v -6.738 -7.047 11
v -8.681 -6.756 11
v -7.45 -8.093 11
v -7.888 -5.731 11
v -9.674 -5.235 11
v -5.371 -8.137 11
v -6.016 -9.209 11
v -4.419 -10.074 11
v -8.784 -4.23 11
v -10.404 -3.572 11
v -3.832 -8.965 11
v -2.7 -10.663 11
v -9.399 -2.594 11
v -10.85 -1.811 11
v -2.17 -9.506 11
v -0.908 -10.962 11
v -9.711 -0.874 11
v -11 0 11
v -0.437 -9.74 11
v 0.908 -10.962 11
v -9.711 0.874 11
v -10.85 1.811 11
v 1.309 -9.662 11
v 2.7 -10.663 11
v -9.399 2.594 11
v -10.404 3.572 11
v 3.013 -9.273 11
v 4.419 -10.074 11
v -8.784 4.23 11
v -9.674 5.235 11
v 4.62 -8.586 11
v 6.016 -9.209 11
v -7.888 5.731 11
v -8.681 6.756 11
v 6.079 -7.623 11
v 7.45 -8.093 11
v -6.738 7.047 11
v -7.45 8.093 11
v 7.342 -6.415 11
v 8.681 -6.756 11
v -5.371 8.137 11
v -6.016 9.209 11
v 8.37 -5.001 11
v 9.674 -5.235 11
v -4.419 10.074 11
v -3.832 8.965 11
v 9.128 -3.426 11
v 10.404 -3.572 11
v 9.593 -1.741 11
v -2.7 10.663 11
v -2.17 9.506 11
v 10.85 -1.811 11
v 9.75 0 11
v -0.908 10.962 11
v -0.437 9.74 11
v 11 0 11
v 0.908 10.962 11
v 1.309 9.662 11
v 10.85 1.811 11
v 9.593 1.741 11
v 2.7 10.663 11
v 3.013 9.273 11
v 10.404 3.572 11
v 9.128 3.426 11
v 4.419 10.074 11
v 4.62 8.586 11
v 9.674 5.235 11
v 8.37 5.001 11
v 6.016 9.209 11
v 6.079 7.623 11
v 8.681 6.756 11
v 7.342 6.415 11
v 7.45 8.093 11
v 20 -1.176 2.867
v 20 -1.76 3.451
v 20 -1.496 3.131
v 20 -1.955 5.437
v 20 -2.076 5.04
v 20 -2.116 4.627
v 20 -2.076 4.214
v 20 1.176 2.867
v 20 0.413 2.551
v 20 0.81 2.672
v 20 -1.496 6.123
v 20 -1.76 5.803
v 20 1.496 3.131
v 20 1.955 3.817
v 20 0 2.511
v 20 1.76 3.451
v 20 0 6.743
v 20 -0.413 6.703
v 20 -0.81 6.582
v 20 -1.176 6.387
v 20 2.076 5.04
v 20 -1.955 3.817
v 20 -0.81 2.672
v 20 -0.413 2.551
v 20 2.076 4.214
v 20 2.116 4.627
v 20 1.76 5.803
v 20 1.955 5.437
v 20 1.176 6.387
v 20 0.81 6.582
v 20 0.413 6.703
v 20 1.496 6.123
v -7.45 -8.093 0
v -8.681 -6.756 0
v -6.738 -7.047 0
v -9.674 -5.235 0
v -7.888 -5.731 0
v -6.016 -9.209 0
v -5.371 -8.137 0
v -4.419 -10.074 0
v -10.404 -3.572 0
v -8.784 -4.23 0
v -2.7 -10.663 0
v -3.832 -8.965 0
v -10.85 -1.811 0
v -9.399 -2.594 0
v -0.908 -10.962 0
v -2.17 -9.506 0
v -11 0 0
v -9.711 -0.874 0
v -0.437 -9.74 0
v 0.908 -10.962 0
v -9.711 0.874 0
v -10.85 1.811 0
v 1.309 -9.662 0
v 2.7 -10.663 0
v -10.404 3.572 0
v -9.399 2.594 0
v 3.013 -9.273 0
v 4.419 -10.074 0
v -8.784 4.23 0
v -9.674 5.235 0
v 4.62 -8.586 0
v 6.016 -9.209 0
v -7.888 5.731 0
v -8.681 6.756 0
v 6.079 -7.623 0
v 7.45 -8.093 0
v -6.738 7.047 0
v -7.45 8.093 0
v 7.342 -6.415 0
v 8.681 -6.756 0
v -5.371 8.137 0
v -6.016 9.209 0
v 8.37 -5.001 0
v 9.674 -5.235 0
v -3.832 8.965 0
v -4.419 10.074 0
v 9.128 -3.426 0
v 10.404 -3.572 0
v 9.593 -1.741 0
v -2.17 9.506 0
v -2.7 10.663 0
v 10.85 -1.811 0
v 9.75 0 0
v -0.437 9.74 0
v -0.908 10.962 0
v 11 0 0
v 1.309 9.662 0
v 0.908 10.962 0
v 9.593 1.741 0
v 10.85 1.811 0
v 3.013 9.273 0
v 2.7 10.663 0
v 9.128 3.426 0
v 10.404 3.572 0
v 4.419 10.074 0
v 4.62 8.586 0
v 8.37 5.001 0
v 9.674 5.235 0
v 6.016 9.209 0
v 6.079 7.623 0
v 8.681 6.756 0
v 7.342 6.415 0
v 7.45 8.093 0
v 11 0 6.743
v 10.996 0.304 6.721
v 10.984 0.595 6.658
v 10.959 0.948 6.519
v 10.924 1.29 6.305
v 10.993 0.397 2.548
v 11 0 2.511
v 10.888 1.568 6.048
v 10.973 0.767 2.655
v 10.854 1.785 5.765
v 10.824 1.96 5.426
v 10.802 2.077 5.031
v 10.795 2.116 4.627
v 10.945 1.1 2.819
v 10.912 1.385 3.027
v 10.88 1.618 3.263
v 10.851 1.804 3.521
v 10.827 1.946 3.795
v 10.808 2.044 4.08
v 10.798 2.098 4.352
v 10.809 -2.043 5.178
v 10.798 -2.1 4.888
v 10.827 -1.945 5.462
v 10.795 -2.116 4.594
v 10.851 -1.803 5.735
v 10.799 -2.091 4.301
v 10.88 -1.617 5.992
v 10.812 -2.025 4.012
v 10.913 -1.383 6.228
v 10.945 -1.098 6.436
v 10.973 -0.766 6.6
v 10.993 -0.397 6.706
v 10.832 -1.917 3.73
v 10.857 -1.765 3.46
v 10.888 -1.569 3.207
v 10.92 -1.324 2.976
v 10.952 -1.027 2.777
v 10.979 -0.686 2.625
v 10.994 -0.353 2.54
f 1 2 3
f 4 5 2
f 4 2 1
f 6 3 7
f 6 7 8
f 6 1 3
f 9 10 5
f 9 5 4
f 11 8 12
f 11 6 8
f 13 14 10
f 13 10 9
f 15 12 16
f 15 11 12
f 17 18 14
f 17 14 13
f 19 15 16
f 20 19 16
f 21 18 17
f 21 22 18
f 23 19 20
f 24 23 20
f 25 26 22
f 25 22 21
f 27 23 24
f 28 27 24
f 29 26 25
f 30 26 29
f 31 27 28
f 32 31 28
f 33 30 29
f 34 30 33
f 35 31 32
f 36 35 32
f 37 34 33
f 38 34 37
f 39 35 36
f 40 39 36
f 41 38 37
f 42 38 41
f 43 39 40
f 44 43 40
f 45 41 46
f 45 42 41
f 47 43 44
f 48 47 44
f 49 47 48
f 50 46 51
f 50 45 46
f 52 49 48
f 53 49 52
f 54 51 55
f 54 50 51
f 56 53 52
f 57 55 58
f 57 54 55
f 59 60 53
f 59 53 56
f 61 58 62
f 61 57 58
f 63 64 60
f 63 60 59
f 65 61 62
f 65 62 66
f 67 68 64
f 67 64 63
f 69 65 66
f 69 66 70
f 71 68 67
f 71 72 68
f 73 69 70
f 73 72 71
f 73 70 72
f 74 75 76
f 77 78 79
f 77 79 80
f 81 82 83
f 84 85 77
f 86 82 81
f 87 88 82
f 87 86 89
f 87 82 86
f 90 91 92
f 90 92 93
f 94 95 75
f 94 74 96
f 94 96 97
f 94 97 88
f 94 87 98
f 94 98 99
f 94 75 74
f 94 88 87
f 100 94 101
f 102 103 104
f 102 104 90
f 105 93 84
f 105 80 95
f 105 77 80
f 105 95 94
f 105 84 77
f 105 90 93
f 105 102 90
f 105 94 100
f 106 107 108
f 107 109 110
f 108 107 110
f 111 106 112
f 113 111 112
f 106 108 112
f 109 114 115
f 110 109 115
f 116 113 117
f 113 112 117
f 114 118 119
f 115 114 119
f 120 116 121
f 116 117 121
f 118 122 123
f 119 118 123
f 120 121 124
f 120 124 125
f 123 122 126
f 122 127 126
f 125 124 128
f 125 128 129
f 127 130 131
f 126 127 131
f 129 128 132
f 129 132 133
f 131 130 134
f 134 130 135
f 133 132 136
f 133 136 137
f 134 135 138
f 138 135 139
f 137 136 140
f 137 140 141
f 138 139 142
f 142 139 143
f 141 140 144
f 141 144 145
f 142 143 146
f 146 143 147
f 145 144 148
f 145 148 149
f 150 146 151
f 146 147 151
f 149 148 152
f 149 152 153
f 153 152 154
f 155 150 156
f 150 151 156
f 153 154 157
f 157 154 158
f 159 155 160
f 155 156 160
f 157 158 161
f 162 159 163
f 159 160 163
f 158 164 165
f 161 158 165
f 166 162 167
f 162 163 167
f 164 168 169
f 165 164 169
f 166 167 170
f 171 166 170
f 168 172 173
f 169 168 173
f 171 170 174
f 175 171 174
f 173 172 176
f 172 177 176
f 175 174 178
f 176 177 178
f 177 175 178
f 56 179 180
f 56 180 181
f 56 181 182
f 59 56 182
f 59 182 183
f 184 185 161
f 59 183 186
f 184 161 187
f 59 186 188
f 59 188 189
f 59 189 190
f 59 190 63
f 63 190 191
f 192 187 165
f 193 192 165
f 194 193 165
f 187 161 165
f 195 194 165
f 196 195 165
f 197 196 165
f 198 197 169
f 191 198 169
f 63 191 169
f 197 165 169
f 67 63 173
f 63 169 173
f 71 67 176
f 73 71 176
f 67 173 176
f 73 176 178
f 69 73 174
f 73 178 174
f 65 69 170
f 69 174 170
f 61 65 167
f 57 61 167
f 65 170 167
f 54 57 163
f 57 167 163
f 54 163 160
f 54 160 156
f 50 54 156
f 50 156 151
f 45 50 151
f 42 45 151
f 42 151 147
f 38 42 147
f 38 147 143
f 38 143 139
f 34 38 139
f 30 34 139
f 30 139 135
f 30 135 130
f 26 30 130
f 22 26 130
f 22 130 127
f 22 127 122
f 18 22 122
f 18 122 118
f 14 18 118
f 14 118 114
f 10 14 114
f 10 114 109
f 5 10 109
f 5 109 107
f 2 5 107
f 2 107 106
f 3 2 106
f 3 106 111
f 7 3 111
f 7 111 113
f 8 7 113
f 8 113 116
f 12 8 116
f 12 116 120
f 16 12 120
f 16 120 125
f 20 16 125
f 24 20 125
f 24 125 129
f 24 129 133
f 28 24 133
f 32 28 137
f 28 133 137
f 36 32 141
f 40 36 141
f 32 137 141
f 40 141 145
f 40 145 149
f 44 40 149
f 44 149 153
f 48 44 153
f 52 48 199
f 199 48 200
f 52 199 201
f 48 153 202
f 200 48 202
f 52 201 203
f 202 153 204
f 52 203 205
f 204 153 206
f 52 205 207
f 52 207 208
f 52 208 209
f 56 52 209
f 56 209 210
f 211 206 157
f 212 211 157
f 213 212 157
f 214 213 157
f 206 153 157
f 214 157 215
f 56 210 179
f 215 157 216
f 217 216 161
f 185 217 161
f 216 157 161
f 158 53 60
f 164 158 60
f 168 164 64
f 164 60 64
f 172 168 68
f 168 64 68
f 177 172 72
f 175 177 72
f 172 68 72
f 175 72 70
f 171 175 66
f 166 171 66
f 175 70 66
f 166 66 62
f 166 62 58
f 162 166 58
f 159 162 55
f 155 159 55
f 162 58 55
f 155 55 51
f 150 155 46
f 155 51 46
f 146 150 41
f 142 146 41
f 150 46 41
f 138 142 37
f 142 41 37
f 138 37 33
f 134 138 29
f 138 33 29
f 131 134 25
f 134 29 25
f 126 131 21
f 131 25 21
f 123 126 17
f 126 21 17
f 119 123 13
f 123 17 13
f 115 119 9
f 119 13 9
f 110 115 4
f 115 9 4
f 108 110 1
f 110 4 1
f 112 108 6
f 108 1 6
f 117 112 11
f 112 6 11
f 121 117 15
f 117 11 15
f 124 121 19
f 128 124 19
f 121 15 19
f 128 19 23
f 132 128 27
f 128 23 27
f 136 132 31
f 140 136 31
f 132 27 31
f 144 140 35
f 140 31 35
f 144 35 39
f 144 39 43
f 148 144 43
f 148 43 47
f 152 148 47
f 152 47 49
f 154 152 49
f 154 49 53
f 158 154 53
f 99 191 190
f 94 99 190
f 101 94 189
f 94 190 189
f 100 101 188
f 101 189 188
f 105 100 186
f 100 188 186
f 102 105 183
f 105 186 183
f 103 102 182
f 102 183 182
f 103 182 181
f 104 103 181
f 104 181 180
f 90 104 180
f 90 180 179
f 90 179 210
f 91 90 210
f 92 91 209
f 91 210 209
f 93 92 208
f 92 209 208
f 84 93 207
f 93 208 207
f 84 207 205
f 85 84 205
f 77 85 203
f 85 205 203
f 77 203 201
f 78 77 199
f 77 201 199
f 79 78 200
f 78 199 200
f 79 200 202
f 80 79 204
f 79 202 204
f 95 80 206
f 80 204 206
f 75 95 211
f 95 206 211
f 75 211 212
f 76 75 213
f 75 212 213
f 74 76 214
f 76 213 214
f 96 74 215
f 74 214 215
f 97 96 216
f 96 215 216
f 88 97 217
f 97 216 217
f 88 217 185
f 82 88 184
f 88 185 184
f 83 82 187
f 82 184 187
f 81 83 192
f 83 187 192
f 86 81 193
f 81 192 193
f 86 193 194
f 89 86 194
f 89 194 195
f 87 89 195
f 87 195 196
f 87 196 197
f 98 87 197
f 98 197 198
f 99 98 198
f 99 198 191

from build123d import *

# Parameters (mm, degrees)
F0_R     = 11
F1_DEPTH = 11
F2_R     = 9.75
F3_DEPTH = 11
F5_R     = 2.116236
F6_DEPTH = 10


with BuildPart() as f1:
    # F0 (on Top) → F1 (new body)
    with BuildSketch(Plane.XY):
        Circle(F0_R)
    extrude(amount=F1_DEPTH)

    # F2 (on face) → F3 (cut)
    with BuildSketch(Plane.XY.offset(11)):
        Circle(F2_R)
    extrude(amount=-F3_DEPTH, mode=Mode.SUBTRACT)

    # F5 (on offset) → F6 (join)
    with BuildSketch(Plane.YZ.offset(10)):
        with Locations((0, 4.627058)):
            Circle(F5_R)
    extrude(amount=F6_DEPTH)


solid = f1.part
